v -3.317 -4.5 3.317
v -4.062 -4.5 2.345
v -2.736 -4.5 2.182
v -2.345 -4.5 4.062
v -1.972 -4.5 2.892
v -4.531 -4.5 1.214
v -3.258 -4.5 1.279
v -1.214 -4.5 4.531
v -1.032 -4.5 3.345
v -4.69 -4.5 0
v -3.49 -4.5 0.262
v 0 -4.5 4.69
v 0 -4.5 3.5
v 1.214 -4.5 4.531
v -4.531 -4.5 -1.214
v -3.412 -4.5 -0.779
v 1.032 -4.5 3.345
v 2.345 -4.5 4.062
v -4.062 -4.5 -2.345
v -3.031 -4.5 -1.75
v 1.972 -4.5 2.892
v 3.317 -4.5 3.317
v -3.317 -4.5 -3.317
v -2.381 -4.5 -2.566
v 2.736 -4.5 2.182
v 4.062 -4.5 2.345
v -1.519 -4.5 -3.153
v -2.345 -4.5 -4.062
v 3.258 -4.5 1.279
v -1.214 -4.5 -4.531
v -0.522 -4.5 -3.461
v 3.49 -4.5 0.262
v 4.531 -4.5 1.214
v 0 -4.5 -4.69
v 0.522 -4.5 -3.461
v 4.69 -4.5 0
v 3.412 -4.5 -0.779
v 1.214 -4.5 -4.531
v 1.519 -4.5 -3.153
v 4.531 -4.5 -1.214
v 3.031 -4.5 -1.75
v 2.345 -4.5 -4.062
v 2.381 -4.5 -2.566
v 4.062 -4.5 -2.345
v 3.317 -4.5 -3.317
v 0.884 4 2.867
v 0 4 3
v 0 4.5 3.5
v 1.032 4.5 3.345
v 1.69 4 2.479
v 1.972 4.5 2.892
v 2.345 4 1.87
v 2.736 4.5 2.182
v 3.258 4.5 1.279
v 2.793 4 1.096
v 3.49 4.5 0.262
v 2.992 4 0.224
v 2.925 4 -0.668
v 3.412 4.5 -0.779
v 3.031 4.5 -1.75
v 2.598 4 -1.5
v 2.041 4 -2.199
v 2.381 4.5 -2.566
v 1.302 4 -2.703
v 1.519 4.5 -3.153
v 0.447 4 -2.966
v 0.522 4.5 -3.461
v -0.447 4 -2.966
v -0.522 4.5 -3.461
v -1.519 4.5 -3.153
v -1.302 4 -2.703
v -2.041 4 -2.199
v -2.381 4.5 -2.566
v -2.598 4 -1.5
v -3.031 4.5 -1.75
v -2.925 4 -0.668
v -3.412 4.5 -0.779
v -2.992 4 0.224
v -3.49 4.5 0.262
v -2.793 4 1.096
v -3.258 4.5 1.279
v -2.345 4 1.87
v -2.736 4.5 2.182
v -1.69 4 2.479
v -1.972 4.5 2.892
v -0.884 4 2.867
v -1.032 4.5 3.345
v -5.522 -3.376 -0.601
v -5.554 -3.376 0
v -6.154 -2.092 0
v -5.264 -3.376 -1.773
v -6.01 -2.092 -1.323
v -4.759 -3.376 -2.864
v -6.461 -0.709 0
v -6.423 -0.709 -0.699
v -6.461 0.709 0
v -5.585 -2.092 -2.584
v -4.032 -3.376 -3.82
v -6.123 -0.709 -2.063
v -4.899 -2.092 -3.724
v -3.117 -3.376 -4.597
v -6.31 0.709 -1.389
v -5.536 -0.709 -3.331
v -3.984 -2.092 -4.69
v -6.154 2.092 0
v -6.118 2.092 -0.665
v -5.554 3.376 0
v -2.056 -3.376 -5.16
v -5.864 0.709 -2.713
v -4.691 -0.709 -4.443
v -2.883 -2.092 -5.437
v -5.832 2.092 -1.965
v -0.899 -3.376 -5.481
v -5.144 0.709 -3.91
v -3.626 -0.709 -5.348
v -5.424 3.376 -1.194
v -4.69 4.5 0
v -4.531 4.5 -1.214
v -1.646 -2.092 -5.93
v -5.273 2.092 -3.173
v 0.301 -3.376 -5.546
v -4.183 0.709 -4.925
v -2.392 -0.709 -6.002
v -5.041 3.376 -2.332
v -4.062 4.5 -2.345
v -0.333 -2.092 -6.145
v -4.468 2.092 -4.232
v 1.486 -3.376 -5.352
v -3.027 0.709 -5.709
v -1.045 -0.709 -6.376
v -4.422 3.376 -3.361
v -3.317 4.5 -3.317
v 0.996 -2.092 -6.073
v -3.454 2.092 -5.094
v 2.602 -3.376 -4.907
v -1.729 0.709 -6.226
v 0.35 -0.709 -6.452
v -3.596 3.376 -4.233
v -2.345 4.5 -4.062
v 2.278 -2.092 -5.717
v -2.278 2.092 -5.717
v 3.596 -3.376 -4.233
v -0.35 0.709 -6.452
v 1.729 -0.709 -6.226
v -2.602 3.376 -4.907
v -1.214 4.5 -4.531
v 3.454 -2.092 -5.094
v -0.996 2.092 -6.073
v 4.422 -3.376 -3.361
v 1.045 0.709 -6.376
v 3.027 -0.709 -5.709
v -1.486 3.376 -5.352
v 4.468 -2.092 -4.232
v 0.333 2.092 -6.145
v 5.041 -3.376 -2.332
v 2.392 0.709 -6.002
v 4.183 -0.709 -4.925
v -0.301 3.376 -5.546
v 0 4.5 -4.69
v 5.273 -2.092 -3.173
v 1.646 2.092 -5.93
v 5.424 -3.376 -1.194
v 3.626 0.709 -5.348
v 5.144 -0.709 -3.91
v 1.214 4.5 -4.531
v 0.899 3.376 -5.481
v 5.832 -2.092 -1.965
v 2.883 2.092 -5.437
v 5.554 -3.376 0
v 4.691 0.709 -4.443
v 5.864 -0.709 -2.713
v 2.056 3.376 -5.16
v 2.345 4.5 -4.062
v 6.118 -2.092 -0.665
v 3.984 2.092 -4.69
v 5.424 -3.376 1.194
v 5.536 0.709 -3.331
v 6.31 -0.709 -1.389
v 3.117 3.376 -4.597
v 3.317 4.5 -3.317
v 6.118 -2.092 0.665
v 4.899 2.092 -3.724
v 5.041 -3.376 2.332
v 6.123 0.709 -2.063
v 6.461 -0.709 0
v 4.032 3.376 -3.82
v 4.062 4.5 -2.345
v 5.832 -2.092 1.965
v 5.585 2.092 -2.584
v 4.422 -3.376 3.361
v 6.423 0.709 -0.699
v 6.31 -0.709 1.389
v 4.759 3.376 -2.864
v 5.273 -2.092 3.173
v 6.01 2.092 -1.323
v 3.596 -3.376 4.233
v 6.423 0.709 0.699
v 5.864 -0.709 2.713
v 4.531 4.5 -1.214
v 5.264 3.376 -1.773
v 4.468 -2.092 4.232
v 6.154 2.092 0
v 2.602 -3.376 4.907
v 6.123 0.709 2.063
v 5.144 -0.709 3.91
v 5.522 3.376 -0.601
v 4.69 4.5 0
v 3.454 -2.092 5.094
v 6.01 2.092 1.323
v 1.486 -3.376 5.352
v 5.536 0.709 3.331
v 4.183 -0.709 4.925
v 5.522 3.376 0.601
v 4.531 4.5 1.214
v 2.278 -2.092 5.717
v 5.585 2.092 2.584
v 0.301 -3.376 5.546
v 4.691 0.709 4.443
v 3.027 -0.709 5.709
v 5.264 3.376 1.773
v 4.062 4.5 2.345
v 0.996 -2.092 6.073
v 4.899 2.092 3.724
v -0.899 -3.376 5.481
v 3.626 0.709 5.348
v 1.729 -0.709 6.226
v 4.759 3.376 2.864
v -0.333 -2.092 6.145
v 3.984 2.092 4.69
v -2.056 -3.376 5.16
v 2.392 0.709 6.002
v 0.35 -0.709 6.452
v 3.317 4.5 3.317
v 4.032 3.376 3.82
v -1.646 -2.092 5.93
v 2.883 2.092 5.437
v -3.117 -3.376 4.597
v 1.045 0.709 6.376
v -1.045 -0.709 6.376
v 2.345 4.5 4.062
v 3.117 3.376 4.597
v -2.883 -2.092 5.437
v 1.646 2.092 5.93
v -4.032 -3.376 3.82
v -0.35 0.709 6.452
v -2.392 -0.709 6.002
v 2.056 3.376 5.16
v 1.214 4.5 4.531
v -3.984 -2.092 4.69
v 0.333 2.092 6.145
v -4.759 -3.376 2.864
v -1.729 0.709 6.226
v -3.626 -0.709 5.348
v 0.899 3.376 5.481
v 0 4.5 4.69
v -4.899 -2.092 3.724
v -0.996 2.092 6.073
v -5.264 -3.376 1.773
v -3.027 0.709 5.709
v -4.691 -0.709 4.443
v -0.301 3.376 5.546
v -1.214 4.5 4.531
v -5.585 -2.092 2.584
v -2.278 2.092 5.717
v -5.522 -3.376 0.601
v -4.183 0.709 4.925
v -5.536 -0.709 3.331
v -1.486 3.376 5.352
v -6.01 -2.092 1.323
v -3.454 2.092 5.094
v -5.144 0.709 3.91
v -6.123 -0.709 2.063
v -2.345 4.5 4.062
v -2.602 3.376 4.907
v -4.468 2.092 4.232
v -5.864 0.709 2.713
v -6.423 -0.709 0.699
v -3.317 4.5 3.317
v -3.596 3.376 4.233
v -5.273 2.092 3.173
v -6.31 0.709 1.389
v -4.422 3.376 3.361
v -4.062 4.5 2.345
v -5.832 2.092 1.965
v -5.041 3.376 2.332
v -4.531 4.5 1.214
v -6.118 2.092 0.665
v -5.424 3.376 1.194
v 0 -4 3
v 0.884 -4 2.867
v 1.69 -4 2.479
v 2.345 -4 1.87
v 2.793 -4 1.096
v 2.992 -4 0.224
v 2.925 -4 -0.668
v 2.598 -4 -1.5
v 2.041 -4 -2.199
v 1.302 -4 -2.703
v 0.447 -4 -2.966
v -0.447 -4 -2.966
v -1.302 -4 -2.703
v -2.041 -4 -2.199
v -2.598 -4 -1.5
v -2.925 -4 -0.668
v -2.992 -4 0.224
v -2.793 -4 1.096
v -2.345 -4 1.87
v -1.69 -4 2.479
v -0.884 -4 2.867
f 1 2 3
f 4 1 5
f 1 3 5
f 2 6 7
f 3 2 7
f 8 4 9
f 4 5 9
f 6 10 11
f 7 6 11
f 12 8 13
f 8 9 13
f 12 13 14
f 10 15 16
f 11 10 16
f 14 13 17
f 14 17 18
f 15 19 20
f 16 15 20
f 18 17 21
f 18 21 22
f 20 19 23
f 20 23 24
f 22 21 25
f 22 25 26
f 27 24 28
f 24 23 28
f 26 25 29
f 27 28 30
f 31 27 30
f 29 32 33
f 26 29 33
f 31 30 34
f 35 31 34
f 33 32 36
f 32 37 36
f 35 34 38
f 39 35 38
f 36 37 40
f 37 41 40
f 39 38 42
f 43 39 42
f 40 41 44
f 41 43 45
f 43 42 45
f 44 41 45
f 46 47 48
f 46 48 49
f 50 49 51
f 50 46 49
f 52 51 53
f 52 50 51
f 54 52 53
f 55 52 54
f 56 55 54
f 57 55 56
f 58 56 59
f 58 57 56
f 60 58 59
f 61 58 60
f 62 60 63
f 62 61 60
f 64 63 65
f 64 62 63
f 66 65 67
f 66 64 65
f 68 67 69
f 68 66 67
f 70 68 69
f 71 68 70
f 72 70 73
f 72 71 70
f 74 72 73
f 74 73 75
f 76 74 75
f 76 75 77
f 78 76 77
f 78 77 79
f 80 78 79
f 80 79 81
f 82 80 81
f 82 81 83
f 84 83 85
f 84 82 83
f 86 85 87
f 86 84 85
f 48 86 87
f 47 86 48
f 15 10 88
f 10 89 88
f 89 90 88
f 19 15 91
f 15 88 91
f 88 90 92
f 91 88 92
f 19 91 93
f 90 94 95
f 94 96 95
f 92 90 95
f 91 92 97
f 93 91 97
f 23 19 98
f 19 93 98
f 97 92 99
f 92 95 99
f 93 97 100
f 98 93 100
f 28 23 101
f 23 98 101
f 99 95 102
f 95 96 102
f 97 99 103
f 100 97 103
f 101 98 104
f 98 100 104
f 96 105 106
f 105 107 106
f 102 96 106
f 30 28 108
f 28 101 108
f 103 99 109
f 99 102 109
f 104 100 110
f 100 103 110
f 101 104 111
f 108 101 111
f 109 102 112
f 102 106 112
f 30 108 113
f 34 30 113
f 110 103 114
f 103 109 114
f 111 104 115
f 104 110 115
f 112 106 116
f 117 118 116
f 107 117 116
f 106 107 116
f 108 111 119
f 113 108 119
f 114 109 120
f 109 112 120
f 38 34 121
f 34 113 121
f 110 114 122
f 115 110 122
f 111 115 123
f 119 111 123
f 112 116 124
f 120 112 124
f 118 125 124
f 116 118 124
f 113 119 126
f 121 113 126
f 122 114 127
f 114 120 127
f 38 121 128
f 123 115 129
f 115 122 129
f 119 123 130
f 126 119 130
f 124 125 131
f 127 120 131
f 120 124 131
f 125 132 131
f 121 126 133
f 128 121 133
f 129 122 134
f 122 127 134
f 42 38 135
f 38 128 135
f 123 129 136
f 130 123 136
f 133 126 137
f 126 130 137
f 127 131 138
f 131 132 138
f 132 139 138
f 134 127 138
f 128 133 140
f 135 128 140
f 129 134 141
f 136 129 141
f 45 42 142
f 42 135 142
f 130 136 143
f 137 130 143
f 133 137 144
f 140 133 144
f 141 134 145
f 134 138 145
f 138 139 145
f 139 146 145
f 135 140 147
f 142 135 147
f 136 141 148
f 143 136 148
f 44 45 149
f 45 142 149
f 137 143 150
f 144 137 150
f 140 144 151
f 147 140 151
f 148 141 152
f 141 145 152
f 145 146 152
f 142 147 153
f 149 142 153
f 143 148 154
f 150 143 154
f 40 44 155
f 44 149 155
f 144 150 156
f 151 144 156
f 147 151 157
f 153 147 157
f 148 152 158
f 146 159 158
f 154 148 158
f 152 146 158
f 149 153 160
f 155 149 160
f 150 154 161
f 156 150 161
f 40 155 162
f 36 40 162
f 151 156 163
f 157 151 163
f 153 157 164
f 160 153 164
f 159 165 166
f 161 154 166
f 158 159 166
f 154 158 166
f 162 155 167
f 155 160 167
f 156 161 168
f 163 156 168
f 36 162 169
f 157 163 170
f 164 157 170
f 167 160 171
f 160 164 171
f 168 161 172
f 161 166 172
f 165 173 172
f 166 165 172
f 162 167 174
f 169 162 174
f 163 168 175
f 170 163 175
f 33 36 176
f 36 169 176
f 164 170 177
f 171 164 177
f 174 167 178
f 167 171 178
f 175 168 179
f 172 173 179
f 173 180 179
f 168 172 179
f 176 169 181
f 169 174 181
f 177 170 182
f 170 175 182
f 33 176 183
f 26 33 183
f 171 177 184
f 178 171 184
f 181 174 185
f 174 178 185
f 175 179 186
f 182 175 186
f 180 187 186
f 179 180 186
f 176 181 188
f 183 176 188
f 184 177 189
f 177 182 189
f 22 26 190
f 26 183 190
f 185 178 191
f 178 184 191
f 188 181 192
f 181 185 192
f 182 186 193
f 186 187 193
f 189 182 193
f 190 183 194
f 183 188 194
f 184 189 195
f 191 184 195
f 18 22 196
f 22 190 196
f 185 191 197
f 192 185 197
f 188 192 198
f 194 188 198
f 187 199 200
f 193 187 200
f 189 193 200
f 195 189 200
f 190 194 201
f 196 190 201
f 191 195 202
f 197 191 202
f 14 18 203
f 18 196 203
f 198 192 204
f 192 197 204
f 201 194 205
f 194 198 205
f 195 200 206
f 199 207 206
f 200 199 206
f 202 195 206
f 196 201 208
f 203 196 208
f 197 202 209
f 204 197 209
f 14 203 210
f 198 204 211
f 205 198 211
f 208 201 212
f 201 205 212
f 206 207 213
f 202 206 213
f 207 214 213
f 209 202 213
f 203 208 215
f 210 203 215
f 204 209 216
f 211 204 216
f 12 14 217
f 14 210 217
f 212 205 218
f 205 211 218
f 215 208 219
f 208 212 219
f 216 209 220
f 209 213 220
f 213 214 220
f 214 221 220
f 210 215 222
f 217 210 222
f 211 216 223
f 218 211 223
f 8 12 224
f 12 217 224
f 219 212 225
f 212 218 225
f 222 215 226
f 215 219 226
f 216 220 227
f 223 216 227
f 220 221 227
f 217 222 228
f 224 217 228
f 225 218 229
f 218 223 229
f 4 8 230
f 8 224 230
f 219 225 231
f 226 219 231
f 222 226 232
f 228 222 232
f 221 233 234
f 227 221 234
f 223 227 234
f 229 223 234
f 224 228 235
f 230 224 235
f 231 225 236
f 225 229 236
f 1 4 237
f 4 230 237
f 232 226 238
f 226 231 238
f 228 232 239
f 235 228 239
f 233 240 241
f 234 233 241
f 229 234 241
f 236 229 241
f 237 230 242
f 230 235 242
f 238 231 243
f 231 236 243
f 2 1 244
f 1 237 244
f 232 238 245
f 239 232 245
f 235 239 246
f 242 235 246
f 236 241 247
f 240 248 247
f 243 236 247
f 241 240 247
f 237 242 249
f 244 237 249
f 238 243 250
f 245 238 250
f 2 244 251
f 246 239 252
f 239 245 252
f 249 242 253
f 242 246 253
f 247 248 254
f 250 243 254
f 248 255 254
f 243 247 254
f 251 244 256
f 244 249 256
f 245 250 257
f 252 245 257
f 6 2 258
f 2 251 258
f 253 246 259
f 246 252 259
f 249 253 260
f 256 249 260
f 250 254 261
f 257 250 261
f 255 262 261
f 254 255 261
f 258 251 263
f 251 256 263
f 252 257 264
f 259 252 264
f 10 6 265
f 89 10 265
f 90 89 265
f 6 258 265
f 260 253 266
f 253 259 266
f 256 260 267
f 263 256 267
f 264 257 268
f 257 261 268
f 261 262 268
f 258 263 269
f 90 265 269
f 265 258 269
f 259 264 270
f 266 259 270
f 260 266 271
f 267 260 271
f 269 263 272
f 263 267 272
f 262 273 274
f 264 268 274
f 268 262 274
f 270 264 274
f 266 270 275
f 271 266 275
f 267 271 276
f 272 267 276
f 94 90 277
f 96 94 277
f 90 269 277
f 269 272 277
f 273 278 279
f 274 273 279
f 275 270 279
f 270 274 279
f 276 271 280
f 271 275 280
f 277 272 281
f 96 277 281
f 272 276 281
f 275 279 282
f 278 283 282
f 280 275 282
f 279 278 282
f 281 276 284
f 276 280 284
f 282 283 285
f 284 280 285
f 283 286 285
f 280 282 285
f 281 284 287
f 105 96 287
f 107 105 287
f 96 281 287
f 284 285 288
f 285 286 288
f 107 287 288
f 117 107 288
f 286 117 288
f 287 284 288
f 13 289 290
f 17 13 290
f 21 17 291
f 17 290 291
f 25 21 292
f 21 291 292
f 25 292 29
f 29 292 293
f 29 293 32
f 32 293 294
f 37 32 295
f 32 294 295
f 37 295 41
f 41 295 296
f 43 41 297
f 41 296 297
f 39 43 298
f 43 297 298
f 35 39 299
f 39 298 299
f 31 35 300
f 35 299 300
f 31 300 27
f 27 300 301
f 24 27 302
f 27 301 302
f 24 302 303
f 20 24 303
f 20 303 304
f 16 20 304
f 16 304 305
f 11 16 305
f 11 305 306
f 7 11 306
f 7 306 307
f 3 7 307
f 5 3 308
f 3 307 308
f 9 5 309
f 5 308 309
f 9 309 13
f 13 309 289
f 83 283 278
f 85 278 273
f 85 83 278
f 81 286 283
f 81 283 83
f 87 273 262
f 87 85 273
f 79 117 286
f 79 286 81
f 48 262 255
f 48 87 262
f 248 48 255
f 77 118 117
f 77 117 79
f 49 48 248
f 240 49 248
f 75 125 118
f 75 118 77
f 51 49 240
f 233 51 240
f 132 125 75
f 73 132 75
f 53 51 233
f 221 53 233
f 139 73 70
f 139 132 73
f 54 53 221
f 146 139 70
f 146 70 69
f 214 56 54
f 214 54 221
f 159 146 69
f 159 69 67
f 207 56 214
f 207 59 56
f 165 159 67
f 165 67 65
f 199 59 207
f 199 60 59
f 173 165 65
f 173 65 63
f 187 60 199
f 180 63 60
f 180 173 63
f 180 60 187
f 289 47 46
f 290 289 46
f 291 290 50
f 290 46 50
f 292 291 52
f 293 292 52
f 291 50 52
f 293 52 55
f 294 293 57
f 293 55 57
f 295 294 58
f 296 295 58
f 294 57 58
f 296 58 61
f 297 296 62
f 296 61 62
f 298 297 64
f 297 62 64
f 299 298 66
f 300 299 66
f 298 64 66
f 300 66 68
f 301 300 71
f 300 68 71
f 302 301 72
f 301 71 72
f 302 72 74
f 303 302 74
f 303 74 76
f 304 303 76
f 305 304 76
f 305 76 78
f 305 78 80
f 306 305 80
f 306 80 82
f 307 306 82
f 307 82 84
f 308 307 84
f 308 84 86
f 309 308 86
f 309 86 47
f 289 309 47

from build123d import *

# Parameters (mm, degrees)
TAGLIO_ESTRUSIONE1_DEPTH      = 12.258330249
TAGLIO_ESTRUSIONE1_DEPTH_BACK = 12.258330249
SCHIZZO2_W                    = 14.577161361
SCHIZZO2_H                    = 2.36968633
SCHIZZO2_H_2                  = 2.58511236
SCHIZZO3_R                    = 3
TAGLIO_ESTRUSIONE2_DEPTH      = 13.86468033
SMUSSO1_SIZE                  = 0.5


with BuildPart() as part:
    # Schizzo1 → Rivoluzione1 (revolve)
    with BuildSketch(Plane.XY):
        with BuildLine():
            Line((0, 6.5), (0, -6.5))
            ThreePointArc((0, -6.5), (-6.5, 0), (0, 6.5))
        make_face()
    revolve(axis=Axis((0, 8.58113686, 0), (0, -1, 0)))

    # Schizzo2 → Taglio-Estrusione1 (cut, two sides: drawn at the far end of the back side and taken through both)
    with BuildSketch(Plane.XY.offset(-TAGLIO_ESTRUSIONE1_DEPTH_BACK)):
        with Locations((0.181731429, 5.684843165)):
            Rectangle(SCHIZZO2_W, SCHIZZO2_H)
        with Locations((0.181731429, -5.79255618)):
            Rectangle(SCHIZZO2_W, SCHIZZO2_H_2)
    extrude(amount=TAGLIO_ESTRUSIONE1_DEPTH + TAGLIO_ESTRUSIONE1_DEPTH_BACK, mode=Mode.SUBTRACT)

    # Schizzo3 → Taglio-Estrusione2 (cut, through all)
    with BuildSketch(Plane(origin=(0, 4.5, 0), x_dir=(-1, 0, 0), z_dir=(0, 1, 0))):
        Circle(SCHIZZO3_R)
    extrude(amount=-TAGLIO_ESTRUSIONE2_DEPTH, mode=Mode.SUBTRACT)

    # Smusso1
    smusso1_edges = [part.edges().sort_by_distance(p)[0] for p in [
        (3, -4.5, 0),
        (3, 4.5, 0),
    ]]
    chamfer(smusso1_edges, length=SMUSSO1_SIZE)


solid = part.part
